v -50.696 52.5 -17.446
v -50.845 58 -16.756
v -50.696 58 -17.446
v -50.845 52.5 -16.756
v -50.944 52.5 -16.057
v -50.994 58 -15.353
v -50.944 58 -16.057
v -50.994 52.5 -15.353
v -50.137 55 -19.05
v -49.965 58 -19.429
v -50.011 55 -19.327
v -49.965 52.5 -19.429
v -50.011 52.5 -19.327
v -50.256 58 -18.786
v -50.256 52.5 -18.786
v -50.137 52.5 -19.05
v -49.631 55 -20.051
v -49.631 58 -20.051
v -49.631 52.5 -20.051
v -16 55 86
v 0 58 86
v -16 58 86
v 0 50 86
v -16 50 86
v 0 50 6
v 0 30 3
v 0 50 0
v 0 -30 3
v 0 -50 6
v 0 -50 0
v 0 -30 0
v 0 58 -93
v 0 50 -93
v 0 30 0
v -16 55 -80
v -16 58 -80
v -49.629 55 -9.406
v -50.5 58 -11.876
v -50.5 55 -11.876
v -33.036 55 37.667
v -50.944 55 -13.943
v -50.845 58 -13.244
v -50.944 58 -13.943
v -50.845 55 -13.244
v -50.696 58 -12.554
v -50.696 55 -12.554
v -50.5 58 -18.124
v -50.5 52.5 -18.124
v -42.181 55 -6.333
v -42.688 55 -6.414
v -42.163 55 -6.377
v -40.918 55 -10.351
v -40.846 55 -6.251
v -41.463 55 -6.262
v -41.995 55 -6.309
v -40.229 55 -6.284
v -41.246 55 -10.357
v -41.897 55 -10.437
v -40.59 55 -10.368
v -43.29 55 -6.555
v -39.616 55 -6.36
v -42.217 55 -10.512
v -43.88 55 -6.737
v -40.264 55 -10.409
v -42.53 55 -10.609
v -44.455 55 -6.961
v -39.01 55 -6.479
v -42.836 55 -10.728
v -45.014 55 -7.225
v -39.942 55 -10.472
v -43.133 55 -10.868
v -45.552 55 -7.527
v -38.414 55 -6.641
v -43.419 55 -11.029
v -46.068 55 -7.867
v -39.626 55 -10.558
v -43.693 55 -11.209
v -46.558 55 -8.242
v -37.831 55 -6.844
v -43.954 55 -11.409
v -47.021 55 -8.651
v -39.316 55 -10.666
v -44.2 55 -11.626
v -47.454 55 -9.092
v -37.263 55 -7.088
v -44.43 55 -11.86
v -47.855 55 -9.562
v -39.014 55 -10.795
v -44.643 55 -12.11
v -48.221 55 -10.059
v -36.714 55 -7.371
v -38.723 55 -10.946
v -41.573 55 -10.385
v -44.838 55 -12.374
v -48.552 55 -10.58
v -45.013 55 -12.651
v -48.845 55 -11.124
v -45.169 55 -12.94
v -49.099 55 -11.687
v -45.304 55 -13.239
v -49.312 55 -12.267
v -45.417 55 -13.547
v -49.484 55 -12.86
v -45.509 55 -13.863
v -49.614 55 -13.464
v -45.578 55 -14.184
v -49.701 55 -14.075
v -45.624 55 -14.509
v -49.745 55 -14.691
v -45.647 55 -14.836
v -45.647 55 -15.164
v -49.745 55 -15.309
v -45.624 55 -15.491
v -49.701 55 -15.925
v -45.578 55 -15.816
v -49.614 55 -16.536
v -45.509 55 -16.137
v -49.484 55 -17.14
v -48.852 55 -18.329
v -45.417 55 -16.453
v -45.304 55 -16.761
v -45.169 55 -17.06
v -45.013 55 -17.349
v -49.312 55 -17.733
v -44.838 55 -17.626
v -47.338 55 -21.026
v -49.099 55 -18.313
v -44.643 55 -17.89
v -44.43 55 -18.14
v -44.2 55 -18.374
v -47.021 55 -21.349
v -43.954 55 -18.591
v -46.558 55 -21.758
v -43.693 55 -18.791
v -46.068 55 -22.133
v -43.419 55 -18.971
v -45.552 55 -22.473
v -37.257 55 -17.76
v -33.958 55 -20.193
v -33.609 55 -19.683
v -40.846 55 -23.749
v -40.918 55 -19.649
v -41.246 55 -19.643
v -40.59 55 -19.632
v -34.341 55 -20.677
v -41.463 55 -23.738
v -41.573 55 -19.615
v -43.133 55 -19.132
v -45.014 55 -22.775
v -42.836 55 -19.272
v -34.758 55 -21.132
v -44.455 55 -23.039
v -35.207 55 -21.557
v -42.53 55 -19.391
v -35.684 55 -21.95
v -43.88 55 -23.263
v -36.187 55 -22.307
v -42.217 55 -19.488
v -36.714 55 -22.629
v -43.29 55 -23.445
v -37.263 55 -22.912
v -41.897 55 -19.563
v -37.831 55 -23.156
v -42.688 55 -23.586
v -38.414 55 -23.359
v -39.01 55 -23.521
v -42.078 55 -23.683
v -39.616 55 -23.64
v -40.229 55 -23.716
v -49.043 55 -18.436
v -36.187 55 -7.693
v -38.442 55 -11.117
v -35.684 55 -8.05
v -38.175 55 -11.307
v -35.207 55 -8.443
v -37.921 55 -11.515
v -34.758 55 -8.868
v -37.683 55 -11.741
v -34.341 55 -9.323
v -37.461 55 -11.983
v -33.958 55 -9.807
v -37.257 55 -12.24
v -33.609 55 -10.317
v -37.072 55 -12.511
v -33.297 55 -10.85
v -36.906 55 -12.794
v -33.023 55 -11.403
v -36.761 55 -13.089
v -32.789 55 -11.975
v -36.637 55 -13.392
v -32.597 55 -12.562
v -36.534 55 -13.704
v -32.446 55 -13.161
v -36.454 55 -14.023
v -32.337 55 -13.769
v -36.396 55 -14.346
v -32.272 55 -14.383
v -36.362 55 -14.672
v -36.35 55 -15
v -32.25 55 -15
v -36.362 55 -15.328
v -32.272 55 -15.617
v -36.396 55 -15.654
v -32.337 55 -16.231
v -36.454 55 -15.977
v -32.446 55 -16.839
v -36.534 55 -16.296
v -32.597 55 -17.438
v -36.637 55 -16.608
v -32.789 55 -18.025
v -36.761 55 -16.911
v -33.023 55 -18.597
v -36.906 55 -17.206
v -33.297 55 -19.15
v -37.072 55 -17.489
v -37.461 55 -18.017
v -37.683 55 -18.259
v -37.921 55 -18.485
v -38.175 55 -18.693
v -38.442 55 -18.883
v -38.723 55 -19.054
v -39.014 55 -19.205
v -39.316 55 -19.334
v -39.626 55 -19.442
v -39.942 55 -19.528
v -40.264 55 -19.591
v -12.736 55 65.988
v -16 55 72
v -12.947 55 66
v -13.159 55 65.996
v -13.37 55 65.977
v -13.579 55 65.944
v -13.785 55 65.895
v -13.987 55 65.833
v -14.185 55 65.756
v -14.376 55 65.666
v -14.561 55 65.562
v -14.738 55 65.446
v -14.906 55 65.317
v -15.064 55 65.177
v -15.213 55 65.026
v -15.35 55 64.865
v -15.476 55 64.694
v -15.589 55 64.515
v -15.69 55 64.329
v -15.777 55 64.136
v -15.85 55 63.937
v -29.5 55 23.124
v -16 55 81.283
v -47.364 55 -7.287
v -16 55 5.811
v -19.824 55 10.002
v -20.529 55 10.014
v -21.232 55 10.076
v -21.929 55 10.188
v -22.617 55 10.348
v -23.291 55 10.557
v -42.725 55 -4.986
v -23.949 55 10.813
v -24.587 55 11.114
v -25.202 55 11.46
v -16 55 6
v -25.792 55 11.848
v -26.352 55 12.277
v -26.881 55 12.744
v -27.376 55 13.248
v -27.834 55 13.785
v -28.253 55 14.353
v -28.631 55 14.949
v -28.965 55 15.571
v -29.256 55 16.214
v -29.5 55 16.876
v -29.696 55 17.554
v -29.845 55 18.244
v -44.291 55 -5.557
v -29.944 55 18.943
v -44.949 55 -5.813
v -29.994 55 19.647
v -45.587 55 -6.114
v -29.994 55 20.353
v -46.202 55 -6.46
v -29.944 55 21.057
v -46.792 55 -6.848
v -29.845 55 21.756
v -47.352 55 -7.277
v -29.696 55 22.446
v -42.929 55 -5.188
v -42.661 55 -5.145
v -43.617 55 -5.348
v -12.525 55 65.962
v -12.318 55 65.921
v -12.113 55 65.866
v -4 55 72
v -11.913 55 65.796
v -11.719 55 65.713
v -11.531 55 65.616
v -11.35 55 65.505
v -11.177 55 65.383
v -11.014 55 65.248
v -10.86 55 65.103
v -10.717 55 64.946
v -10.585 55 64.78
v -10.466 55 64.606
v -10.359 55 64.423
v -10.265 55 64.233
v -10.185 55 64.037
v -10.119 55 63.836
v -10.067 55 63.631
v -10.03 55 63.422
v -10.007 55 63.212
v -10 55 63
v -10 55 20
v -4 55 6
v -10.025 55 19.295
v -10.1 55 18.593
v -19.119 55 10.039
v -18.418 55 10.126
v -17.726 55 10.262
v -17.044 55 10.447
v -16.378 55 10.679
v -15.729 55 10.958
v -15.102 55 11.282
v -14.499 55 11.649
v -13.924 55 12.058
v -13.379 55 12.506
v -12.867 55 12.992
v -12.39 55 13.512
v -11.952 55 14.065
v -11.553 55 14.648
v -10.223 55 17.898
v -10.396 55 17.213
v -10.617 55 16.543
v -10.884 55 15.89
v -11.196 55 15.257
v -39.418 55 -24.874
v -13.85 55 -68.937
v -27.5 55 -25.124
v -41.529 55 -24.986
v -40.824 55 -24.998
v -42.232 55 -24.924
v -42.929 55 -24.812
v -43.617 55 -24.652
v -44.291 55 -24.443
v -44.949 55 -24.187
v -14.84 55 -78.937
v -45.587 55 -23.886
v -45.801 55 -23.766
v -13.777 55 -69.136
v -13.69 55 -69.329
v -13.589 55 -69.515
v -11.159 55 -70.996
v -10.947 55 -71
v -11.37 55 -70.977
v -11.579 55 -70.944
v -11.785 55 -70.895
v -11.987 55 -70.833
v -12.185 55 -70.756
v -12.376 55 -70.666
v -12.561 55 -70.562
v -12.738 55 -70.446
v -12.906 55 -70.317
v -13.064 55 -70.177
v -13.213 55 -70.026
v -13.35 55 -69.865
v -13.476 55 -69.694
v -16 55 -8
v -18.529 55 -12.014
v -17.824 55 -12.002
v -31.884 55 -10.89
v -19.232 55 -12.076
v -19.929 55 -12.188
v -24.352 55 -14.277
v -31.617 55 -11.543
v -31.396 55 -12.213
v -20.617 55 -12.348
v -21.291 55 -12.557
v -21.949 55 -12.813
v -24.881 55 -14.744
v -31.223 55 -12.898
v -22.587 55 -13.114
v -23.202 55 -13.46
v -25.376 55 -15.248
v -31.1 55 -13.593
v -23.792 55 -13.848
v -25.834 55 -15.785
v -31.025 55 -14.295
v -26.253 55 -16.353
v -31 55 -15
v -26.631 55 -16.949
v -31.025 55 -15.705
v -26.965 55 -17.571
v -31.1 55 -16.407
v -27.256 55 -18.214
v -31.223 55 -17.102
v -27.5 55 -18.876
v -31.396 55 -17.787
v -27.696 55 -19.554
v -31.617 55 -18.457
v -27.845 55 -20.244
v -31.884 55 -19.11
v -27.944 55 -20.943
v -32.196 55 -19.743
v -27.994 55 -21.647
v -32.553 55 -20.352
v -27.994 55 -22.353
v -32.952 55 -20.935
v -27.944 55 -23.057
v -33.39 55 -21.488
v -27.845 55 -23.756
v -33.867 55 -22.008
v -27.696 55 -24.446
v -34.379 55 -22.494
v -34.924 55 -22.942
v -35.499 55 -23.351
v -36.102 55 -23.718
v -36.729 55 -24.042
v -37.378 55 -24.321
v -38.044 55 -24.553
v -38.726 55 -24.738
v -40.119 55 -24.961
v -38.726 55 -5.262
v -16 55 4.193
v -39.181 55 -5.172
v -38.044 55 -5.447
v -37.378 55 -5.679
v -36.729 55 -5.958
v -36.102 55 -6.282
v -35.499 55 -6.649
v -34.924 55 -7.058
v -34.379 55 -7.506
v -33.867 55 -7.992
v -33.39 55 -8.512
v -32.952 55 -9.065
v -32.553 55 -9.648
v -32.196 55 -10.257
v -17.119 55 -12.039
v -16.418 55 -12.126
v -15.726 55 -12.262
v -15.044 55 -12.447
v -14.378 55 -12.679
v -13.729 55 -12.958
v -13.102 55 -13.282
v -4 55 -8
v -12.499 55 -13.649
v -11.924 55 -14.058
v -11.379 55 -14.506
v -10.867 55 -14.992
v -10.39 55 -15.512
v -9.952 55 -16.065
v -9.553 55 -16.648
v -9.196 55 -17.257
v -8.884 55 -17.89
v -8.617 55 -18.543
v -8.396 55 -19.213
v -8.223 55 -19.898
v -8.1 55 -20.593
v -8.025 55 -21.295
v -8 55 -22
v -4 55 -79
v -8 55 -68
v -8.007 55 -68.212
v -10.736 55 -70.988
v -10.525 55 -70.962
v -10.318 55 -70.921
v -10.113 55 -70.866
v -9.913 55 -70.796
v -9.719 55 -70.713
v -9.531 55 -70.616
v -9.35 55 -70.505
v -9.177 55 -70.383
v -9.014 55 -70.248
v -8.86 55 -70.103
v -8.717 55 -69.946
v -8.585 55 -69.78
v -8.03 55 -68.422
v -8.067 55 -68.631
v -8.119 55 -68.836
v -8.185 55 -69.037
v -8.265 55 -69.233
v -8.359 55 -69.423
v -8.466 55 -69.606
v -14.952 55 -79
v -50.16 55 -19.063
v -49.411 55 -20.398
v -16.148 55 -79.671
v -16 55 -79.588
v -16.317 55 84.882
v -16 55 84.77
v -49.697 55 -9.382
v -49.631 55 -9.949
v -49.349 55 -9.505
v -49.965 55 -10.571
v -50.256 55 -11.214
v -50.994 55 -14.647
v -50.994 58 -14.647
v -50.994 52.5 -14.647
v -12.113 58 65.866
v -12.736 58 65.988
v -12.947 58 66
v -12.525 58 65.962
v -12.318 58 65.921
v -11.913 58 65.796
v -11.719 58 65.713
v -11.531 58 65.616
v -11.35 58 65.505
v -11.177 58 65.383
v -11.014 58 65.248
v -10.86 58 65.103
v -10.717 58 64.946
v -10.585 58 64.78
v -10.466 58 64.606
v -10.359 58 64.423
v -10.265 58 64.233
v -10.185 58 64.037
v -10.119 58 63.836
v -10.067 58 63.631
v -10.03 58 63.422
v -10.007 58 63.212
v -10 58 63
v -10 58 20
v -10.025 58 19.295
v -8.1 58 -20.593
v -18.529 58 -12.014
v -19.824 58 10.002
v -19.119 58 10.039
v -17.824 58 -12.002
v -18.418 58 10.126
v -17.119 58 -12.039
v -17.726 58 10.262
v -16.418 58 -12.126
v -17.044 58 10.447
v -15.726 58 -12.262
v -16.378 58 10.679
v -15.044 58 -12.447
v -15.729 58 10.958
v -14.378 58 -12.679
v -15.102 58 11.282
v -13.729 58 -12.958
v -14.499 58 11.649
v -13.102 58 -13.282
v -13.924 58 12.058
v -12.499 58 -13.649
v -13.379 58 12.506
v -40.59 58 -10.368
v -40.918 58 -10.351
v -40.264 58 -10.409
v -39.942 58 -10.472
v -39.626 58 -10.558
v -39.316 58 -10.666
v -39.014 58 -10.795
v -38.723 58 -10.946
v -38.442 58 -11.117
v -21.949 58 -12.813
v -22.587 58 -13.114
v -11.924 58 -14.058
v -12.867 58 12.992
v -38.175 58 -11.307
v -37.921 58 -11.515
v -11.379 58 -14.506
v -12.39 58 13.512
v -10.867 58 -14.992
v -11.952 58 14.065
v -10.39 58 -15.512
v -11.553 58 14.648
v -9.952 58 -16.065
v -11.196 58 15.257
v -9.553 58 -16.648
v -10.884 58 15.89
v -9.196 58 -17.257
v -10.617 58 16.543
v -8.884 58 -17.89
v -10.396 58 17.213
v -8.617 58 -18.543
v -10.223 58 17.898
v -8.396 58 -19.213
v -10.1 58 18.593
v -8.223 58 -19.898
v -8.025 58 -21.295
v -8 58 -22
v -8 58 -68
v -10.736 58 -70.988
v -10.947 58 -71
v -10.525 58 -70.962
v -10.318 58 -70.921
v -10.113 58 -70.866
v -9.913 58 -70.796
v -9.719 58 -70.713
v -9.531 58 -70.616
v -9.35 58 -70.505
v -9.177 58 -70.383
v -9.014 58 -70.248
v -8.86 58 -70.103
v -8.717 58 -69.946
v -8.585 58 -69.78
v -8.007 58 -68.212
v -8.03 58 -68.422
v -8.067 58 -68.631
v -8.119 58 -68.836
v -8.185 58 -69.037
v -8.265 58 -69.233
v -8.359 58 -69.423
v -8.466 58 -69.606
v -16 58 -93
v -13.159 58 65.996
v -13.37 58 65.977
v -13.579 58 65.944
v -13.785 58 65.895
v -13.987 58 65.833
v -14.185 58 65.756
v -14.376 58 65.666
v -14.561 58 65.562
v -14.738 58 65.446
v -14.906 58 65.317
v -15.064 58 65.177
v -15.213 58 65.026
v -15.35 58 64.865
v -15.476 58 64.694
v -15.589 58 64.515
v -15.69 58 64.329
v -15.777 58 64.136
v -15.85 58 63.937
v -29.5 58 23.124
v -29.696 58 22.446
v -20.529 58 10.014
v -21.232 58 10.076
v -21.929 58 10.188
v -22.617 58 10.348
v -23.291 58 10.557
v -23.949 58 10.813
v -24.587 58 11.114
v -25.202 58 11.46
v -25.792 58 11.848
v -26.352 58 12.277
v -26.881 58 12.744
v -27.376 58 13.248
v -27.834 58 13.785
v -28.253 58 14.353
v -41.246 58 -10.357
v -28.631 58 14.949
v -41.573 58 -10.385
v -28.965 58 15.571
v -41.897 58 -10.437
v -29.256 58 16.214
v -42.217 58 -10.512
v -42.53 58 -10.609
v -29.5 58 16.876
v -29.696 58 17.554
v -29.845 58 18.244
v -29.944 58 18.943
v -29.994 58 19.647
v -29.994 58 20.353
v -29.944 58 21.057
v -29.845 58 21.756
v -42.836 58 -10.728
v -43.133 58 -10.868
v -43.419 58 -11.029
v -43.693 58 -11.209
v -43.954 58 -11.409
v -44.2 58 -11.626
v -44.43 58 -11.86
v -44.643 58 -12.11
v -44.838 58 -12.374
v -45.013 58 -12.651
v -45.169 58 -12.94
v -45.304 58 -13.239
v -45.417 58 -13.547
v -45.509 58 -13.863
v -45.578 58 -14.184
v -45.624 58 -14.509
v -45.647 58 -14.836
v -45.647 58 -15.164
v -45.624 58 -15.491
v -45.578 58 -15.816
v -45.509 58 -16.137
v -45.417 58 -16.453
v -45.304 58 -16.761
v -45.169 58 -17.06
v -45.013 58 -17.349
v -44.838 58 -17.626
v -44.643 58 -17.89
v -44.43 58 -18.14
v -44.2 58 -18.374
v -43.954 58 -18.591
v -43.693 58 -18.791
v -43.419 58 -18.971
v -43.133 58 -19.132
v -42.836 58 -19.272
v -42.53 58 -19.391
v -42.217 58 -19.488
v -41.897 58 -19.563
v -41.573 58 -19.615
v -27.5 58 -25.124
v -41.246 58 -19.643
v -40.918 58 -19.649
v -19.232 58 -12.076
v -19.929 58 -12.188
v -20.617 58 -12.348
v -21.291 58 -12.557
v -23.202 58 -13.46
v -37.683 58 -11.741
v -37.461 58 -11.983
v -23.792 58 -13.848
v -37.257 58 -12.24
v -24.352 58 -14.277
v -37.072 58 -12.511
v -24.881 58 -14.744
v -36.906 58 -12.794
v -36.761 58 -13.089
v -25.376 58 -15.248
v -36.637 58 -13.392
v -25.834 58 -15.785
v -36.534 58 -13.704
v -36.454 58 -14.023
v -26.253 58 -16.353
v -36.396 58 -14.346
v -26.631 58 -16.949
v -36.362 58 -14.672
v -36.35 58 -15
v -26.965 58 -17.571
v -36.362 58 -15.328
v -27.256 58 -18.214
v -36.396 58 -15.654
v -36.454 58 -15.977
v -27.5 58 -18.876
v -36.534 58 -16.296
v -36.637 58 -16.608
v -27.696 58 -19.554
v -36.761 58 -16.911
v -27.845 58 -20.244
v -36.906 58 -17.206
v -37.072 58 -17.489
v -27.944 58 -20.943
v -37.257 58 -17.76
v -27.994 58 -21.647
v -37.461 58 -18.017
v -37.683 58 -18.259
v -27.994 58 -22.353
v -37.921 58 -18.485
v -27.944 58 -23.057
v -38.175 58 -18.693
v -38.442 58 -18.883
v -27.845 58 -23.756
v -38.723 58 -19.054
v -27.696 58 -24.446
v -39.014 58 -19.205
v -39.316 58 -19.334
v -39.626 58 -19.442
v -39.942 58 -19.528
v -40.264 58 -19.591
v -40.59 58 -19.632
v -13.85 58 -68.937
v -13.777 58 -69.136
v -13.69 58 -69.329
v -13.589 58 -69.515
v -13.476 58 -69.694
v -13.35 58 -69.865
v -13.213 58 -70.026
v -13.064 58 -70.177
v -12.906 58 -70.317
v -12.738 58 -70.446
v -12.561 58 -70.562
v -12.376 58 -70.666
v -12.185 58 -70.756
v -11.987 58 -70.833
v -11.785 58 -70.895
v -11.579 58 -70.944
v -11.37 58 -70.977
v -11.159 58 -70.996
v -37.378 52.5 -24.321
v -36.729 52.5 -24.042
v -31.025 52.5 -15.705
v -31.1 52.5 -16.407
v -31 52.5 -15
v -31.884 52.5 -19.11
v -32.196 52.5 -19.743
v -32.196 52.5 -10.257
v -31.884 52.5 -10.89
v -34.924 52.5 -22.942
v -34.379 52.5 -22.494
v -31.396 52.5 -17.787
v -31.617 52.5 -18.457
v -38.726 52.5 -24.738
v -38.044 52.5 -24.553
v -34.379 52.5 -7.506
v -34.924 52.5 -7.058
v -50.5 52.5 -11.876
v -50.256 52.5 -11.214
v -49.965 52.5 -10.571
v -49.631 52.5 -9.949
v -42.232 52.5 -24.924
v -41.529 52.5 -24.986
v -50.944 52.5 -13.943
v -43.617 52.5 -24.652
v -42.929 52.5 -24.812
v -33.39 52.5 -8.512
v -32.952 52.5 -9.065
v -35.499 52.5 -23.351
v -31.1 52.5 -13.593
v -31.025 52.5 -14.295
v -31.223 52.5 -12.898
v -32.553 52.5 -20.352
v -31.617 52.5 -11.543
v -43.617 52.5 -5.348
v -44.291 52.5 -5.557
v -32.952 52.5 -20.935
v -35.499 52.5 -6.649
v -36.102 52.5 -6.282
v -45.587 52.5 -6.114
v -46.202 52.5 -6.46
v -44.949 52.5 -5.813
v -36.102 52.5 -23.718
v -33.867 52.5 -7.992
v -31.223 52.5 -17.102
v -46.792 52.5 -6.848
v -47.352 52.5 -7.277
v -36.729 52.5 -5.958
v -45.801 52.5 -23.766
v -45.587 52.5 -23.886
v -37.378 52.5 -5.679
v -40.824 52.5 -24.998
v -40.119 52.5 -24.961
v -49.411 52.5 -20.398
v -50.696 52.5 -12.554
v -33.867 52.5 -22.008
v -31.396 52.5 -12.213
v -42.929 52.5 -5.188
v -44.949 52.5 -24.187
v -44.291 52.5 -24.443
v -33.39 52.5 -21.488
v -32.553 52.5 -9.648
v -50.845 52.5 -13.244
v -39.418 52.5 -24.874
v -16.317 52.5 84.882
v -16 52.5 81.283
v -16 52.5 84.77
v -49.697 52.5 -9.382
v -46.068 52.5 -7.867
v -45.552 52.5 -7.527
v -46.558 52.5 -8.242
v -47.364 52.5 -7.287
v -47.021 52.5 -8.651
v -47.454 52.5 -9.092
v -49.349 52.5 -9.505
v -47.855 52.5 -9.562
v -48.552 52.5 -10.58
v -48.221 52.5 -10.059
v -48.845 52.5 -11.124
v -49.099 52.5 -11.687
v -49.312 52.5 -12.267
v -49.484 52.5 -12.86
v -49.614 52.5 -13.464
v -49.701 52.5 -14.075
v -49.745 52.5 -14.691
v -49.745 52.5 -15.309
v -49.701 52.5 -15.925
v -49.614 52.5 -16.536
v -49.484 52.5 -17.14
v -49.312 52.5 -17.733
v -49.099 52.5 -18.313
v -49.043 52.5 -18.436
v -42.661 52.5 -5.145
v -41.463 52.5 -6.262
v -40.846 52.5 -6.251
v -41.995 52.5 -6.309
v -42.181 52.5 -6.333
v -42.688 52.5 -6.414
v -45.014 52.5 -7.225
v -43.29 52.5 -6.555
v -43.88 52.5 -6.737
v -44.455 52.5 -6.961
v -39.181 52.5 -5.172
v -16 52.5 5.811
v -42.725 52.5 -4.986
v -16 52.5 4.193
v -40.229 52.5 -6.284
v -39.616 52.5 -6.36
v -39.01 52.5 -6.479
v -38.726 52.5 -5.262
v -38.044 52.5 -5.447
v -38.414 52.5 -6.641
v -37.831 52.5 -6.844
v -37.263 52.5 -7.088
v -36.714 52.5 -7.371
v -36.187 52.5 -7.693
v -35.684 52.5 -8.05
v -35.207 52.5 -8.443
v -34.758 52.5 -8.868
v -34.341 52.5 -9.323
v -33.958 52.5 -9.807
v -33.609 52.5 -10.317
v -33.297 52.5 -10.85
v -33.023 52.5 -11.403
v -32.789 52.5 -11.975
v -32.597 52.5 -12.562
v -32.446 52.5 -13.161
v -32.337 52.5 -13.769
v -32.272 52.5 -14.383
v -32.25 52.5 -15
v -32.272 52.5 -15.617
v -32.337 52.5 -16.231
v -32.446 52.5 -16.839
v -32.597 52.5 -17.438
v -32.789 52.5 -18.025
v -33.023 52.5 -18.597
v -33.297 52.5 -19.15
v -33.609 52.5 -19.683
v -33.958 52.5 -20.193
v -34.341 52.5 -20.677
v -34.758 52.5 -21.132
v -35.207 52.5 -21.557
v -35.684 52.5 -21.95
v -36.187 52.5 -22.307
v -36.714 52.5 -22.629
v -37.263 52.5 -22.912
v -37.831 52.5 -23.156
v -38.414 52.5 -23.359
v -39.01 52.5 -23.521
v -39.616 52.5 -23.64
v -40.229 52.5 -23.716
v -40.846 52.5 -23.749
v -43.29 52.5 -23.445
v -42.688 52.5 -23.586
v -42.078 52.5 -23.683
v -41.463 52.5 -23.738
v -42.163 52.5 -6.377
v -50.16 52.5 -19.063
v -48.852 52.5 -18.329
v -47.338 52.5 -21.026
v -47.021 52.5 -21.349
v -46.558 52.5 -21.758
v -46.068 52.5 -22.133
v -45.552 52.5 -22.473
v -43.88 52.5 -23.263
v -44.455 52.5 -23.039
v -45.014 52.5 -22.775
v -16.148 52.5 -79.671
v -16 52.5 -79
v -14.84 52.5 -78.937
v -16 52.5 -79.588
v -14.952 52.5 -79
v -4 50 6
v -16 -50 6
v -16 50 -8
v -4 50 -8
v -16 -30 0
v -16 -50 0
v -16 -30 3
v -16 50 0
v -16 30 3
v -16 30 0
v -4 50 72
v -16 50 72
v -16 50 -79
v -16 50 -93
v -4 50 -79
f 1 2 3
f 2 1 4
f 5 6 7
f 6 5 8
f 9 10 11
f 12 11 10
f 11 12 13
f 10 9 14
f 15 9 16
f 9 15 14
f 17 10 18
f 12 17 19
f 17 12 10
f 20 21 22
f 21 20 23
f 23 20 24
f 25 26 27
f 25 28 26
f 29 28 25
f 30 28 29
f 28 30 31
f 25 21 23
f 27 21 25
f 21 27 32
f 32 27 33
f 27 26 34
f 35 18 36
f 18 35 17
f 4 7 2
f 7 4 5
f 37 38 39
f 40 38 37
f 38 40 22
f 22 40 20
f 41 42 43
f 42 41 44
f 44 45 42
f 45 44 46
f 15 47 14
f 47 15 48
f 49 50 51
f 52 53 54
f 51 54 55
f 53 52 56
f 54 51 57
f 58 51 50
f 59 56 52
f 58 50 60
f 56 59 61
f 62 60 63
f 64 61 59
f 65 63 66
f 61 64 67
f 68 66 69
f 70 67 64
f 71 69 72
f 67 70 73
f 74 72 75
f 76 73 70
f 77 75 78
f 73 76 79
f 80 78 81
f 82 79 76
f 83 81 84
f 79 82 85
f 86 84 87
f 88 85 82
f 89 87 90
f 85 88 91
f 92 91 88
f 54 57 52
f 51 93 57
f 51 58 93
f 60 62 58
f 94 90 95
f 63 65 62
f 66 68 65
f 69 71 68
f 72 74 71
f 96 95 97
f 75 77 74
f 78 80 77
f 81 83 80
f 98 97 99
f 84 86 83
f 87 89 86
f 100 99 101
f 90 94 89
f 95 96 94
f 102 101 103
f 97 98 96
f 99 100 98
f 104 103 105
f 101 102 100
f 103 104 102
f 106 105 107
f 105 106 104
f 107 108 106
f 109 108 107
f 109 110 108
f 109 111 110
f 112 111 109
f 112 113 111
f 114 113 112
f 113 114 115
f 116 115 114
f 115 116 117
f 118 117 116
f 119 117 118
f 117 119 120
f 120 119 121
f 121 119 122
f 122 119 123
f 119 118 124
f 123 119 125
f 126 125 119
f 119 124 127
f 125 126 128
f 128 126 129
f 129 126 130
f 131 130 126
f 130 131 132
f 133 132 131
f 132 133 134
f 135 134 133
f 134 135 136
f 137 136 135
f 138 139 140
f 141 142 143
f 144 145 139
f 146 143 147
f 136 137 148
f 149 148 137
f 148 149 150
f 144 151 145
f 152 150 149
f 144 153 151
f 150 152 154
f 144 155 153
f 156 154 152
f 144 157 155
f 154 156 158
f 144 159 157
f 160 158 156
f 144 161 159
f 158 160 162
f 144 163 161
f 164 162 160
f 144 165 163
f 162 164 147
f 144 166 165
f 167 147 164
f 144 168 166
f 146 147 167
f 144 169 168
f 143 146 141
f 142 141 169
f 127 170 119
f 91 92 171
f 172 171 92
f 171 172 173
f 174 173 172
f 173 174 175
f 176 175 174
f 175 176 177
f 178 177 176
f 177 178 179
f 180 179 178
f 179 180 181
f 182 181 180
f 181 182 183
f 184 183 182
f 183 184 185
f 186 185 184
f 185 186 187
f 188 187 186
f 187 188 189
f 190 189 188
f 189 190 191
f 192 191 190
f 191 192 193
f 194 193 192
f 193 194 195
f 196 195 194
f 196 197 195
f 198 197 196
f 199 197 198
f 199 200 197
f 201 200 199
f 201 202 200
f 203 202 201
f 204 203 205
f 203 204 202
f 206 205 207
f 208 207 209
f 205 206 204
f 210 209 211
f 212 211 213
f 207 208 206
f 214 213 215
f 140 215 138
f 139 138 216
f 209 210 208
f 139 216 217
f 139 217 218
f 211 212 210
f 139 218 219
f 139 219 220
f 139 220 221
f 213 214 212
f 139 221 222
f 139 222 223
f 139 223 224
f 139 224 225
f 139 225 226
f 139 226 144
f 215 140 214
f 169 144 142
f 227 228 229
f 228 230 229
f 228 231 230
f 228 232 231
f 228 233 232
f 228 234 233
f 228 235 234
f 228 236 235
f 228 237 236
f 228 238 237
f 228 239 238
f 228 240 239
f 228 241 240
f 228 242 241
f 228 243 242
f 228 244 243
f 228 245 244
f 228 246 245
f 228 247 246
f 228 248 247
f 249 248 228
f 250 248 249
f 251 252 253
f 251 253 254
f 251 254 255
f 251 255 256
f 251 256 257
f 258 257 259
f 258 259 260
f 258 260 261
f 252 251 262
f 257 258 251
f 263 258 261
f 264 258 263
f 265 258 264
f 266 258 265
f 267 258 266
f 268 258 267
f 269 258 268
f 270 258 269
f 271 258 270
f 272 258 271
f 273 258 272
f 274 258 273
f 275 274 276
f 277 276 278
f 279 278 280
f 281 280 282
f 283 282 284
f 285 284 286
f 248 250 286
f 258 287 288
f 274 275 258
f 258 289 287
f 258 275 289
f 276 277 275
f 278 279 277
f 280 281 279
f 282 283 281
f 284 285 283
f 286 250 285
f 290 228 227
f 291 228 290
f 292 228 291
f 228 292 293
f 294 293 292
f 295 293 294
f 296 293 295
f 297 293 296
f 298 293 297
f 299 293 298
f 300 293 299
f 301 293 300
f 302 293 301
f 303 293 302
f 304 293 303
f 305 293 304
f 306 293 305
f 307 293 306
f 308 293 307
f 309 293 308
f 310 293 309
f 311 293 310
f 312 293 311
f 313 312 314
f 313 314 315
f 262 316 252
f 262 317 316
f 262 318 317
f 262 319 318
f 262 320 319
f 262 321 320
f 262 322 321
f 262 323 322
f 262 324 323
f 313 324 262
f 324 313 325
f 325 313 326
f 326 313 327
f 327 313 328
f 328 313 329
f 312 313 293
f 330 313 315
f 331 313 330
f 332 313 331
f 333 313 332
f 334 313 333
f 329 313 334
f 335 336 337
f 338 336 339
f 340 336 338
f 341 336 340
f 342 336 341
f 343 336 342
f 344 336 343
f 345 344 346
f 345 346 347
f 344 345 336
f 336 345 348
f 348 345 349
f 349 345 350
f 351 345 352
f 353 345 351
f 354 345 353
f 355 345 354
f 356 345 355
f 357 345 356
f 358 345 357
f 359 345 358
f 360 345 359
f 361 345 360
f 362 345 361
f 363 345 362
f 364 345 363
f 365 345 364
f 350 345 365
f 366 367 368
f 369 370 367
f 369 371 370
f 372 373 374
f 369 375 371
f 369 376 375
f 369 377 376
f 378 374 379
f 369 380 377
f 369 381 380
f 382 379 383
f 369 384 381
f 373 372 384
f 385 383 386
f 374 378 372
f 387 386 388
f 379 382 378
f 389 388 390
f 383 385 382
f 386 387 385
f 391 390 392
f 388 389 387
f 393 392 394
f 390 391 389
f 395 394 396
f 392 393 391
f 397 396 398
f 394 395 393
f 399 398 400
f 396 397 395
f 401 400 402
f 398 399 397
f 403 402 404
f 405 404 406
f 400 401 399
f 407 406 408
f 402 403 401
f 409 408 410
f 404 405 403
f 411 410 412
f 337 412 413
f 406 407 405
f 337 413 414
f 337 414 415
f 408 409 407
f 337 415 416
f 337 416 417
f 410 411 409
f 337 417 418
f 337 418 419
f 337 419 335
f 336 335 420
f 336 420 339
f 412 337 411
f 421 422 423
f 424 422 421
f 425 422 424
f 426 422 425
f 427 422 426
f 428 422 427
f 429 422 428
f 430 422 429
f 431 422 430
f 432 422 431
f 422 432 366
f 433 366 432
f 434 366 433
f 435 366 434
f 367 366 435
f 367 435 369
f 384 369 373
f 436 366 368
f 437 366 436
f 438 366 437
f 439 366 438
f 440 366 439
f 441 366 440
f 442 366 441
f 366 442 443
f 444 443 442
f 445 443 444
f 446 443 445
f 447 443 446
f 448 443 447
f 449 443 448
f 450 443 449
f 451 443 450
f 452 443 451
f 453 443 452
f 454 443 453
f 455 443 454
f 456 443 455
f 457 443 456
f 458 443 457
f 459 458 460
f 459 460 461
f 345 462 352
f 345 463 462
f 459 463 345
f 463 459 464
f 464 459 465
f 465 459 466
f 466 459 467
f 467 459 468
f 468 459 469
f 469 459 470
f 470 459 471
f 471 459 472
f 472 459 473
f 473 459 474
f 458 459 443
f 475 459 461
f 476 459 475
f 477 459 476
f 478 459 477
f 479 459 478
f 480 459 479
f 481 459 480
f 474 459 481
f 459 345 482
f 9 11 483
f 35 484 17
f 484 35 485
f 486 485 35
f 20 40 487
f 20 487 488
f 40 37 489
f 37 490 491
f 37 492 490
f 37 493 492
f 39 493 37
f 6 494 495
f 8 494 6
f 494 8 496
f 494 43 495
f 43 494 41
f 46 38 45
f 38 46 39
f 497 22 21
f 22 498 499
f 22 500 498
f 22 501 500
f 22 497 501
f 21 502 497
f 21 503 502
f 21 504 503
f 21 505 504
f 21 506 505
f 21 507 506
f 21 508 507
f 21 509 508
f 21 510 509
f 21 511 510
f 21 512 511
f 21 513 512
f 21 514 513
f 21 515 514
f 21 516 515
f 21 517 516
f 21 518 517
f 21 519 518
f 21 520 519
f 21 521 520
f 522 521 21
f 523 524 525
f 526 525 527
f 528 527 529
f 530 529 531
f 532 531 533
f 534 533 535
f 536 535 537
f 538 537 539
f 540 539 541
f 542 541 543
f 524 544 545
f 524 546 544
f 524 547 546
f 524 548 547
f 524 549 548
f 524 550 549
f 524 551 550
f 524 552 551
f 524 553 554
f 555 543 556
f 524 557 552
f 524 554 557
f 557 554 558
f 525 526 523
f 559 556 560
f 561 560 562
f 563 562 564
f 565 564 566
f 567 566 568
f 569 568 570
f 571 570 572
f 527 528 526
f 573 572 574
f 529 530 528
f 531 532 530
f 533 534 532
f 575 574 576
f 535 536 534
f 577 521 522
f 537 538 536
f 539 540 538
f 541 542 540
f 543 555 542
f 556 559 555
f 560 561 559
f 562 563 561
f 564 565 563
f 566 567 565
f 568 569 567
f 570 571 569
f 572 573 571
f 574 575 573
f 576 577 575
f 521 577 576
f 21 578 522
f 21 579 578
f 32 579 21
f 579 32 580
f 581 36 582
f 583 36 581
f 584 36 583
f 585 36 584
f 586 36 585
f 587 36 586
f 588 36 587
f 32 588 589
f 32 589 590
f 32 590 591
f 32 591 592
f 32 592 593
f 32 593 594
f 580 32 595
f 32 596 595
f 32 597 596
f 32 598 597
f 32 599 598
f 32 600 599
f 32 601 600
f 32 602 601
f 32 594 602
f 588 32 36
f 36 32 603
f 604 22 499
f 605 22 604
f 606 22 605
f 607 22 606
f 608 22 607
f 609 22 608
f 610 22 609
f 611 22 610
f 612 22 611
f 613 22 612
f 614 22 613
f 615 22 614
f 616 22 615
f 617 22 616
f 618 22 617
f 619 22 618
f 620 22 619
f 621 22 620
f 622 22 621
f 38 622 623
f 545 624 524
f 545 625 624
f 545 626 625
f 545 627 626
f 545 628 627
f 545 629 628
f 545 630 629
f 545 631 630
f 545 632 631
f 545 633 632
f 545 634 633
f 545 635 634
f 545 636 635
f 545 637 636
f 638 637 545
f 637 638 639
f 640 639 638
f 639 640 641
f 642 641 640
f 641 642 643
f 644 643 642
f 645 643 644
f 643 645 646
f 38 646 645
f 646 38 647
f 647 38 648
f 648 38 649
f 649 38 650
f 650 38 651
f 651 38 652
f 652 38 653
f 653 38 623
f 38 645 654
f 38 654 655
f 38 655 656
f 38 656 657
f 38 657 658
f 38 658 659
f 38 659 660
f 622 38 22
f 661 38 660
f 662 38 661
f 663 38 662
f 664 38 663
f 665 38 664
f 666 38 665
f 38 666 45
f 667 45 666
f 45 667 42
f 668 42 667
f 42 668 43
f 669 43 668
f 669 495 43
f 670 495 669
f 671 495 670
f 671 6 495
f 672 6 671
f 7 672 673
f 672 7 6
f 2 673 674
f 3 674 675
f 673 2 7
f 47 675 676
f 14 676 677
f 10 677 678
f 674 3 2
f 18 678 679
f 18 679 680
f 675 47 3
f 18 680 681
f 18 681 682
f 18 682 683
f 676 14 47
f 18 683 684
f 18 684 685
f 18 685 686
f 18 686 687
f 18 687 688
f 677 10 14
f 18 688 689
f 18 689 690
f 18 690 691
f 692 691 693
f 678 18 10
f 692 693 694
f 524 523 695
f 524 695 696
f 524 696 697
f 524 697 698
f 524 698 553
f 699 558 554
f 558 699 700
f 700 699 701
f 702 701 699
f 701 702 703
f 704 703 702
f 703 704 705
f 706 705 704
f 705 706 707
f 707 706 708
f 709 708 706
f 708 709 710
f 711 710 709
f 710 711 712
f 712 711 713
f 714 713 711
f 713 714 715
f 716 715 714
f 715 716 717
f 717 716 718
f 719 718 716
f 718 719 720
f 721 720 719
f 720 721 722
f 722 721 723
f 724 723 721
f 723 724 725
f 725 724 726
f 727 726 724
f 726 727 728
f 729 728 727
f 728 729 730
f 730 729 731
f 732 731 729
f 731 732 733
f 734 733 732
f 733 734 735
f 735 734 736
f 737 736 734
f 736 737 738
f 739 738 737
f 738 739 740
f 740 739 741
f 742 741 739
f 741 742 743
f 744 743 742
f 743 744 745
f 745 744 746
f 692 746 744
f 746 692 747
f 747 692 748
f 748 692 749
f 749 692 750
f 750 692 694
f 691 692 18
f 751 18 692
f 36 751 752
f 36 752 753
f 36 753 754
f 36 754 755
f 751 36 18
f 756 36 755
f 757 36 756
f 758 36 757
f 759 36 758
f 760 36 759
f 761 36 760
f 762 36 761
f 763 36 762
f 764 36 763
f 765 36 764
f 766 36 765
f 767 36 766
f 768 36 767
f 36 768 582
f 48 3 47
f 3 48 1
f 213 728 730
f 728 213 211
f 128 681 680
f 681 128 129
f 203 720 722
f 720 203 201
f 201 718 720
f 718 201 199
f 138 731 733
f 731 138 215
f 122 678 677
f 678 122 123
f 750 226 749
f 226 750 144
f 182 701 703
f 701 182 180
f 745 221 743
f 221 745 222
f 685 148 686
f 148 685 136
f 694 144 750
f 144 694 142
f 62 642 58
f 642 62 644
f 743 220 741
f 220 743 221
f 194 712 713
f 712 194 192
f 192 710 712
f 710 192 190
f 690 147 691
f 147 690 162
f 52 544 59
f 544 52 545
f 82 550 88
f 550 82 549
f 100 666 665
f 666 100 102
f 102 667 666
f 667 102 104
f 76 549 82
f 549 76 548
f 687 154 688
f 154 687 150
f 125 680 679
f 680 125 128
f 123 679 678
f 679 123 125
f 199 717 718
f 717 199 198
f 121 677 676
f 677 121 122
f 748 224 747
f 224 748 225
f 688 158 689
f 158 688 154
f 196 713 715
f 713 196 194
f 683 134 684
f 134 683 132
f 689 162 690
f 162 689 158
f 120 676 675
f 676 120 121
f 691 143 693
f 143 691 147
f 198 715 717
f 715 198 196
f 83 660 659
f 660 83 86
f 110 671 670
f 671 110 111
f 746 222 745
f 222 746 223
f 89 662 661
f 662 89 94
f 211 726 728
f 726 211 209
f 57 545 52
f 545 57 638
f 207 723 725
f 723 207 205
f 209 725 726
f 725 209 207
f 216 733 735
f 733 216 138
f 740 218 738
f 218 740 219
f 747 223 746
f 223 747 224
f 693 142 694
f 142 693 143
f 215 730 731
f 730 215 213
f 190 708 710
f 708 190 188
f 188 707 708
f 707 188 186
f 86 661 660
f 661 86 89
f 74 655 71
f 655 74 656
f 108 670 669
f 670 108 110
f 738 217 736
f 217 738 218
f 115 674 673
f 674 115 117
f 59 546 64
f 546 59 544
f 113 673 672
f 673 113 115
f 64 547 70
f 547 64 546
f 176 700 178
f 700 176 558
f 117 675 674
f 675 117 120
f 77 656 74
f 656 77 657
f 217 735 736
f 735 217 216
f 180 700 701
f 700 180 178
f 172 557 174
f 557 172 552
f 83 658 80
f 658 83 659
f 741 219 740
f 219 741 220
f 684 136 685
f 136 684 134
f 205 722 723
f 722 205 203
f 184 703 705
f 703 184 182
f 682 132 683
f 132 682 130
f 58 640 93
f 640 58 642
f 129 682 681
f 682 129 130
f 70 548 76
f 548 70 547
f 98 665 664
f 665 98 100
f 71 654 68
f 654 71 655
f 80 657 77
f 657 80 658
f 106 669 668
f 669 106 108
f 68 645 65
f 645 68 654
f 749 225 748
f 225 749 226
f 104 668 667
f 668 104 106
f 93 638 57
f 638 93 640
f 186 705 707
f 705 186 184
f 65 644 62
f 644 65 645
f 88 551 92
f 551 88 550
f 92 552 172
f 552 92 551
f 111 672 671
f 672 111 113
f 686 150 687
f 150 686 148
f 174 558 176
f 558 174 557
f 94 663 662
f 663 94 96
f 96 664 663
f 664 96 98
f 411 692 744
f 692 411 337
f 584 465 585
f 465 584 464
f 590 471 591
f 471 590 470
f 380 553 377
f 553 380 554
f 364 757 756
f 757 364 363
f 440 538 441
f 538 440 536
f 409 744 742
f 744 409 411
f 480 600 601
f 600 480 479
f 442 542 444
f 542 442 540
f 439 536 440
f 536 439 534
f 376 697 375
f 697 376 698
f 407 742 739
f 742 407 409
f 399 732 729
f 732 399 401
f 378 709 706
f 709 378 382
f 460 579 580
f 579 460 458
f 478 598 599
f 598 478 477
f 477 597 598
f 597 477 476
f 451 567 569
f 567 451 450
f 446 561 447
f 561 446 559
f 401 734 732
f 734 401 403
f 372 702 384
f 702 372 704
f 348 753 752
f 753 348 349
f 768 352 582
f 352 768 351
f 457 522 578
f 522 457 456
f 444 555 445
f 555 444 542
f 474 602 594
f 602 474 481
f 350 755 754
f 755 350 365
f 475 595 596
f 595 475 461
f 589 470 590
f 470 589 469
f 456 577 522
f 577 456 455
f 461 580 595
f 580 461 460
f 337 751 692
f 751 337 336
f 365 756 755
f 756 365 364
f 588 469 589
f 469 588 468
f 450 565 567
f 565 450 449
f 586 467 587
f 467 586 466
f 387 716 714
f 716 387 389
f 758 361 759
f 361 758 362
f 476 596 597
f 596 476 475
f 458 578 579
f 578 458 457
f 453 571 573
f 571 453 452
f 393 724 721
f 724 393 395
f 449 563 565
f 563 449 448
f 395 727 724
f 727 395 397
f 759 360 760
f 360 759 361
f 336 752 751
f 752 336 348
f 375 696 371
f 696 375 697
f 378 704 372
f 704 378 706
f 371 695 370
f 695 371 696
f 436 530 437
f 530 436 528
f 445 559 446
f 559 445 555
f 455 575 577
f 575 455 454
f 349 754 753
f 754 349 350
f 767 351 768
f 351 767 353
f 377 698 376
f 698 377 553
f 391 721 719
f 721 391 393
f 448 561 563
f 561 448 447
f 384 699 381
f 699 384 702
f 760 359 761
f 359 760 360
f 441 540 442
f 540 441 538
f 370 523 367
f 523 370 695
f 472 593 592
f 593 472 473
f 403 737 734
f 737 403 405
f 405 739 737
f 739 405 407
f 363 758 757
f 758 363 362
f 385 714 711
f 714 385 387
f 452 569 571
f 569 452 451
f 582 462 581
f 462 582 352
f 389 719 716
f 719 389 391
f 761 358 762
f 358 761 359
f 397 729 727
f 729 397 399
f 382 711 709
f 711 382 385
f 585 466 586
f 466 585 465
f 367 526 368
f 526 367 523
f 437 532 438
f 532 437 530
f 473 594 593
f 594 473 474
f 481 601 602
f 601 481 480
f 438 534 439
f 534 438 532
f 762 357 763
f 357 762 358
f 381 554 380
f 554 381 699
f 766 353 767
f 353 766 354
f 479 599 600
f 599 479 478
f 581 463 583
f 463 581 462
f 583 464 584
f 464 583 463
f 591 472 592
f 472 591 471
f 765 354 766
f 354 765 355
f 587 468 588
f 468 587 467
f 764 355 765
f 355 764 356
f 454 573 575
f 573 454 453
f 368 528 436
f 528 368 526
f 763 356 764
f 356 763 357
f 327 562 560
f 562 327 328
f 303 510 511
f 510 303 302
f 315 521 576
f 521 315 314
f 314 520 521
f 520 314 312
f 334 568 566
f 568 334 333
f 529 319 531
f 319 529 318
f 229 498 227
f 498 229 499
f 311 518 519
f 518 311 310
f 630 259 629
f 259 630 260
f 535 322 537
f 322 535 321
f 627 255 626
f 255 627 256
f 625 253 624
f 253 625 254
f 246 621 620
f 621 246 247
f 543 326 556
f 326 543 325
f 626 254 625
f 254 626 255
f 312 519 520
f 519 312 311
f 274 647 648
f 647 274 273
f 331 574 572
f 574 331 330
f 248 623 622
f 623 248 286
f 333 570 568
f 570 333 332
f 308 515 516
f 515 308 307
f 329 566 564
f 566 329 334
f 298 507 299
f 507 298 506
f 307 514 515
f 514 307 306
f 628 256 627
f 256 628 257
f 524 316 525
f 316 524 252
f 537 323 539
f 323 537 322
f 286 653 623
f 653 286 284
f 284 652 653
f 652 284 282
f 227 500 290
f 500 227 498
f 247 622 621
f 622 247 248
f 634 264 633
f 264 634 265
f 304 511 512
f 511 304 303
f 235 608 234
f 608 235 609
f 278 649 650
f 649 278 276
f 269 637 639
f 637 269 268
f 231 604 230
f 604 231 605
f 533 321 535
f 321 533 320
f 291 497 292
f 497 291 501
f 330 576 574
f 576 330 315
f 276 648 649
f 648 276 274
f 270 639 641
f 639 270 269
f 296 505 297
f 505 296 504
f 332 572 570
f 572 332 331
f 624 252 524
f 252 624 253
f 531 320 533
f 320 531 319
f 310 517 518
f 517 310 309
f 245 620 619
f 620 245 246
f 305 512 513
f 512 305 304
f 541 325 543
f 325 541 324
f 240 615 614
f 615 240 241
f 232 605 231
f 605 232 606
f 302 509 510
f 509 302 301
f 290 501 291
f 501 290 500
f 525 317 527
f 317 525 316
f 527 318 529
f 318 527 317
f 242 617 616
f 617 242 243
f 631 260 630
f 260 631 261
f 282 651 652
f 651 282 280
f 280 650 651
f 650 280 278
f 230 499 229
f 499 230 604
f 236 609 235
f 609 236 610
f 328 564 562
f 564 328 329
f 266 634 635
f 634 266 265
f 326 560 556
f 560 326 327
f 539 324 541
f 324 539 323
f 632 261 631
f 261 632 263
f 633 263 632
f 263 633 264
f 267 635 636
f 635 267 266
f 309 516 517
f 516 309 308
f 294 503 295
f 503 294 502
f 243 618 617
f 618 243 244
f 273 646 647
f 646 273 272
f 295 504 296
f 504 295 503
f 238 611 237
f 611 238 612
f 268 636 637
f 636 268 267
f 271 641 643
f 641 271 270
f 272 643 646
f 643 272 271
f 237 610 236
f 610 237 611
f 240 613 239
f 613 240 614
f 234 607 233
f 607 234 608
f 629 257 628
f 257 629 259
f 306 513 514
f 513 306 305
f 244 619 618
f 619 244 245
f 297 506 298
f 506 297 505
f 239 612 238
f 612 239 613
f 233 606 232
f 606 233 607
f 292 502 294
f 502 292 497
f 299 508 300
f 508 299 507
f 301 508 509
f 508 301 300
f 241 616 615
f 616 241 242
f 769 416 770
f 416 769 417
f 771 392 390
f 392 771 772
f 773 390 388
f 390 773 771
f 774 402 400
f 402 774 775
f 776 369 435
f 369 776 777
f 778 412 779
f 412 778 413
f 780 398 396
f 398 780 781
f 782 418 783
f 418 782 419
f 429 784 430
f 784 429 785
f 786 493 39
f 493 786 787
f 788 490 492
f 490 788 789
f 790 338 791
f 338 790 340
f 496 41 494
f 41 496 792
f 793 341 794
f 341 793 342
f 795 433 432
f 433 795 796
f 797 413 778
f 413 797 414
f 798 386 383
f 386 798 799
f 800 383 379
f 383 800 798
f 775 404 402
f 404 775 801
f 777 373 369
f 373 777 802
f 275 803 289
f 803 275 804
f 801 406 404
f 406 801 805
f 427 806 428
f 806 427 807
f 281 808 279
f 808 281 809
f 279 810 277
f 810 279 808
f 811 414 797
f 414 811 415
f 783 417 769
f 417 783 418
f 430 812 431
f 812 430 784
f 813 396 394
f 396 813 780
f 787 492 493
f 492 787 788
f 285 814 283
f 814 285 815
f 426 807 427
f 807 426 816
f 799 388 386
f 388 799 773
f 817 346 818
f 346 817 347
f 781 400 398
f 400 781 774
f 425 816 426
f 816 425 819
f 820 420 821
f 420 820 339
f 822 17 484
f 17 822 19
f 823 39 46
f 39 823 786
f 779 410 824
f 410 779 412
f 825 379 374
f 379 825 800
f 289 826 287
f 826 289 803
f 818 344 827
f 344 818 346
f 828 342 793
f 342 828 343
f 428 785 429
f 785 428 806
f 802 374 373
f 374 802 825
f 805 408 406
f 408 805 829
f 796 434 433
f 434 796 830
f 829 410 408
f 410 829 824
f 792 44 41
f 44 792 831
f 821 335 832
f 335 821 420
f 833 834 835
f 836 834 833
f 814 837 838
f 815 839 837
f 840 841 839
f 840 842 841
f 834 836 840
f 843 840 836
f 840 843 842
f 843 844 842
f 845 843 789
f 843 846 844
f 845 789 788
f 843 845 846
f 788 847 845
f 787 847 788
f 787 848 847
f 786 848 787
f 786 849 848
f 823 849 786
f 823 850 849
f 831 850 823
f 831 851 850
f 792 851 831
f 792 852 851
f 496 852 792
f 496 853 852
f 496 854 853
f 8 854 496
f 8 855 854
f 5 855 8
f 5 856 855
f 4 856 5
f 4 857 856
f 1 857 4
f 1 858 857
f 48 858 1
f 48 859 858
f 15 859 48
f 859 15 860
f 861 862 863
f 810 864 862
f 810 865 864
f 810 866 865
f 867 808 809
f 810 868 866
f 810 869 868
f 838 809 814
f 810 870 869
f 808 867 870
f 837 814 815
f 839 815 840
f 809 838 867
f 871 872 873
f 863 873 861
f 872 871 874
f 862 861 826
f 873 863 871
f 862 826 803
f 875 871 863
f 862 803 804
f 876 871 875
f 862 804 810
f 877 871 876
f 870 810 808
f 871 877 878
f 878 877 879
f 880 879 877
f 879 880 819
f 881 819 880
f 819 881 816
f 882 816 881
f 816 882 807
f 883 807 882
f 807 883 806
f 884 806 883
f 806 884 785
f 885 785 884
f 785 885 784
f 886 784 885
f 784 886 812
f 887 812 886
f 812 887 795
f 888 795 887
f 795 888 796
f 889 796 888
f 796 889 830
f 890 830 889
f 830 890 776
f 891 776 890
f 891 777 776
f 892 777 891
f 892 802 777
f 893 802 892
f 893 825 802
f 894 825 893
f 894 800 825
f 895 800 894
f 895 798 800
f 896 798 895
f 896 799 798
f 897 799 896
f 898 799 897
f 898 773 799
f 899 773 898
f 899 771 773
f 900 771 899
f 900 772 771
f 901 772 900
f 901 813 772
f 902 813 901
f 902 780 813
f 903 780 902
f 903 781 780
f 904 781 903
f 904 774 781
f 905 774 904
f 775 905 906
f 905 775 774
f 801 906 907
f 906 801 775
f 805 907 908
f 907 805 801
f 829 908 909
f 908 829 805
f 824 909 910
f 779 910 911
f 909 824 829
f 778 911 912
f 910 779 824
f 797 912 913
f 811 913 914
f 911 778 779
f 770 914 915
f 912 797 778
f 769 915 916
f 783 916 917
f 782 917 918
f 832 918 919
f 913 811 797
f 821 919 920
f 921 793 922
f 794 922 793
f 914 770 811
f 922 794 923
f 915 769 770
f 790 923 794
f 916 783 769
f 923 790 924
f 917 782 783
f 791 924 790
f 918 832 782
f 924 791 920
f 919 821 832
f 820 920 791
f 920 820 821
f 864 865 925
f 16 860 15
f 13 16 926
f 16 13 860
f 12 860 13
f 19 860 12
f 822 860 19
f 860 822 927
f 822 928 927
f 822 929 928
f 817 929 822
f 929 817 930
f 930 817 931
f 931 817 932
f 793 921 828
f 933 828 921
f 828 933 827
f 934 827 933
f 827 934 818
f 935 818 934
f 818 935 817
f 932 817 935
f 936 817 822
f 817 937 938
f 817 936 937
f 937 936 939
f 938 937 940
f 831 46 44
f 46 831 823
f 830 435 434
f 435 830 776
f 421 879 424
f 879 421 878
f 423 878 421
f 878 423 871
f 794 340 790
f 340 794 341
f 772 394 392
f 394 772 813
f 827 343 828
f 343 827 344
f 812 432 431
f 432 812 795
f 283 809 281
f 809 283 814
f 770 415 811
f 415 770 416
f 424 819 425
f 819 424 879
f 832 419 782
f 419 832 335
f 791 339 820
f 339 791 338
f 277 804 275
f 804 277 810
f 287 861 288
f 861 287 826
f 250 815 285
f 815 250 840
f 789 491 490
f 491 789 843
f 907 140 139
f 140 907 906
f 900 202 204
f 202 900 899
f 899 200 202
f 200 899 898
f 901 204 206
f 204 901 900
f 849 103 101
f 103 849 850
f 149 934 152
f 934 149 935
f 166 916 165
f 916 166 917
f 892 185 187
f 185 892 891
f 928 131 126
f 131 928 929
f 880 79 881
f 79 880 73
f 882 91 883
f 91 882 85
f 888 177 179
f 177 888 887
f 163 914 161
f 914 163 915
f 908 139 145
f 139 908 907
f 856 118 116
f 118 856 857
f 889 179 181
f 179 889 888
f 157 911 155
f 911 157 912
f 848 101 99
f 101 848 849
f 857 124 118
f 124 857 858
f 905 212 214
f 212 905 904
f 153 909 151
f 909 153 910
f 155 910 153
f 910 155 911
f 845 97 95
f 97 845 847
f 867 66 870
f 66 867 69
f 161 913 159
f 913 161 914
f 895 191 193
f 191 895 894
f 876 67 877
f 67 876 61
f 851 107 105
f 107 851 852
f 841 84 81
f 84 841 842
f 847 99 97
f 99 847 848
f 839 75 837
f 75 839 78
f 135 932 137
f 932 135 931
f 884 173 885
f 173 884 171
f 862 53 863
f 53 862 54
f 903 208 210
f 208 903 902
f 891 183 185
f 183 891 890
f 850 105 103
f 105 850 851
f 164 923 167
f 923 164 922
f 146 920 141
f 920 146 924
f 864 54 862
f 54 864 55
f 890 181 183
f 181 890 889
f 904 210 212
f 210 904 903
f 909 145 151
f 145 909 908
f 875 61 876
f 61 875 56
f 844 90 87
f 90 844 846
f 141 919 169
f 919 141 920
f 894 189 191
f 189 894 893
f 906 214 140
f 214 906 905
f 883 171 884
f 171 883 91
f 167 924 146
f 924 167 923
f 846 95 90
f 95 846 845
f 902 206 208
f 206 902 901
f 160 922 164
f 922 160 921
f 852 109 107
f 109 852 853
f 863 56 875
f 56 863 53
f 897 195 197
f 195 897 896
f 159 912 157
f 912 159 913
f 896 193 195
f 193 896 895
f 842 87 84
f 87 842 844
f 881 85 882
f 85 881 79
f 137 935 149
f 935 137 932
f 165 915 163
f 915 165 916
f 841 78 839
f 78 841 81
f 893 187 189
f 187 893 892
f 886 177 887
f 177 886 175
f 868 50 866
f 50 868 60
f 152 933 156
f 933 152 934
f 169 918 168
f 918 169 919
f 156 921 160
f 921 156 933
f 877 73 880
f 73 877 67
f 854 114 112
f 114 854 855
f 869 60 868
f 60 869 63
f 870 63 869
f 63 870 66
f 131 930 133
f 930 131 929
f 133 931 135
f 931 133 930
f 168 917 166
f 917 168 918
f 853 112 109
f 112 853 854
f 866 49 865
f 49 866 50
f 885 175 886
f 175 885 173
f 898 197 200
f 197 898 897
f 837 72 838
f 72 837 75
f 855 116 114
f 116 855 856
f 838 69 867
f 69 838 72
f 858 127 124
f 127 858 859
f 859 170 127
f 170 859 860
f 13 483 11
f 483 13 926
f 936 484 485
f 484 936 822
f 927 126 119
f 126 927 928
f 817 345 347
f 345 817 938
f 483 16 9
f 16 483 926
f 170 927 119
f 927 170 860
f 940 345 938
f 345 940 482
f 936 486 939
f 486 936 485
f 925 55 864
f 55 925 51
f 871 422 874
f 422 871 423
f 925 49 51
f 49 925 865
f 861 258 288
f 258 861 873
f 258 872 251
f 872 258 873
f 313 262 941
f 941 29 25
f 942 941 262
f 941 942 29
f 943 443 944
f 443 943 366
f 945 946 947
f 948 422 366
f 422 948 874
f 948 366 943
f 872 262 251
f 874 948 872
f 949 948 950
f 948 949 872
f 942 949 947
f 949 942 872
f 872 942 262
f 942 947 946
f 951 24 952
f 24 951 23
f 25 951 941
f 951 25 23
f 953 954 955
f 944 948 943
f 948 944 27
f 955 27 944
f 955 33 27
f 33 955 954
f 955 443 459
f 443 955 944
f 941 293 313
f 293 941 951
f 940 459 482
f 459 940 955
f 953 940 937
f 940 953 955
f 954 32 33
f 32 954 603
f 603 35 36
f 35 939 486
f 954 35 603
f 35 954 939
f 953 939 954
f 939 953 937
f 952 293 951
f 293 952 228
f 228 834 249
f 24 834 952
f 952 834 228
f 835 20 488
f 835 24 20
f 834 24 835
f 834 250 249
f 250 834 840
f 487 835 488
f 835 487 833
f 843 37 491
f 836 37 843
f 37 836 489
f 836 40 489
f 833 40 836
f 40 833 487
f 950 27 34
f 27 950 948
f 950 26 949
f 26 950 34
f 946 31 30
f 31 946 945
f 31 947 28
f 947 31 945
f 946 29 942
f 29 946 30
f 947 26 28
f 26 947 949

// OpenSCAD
// file: ../Parts/rounder.scad
// rounder.scad
// cutting tool for rounding off corners with a cylinder

//---------------------
module rounder(
r=10,   // radius
h=10,   // height
f=22,    // $fn
extra=0.01  // extra size for the cube
){

difference(){
  translate([-extra,-extra,-extra])
  cube([r+extra,r+extra,h+2*extra]);
  translate([r,r,-1])
  cylinder(r=r,h=h+2,$fn=f);
}

}

//========================

rounder();

//========================
// main file
//=================================================================================
// tele.scad
//
// TelePrompter parts for the fluid head on tripod
//
// Dr Tom Flint, 25 May 2021
//=================================================================================

use <../Parts/rounder.scad>

//--------------------------------------------------------------------------------

topThick=3;
bridgeThick=3;
sideThick=3;
frontThick=3;
x1=2;   // offset for M3 attach points

$fn=89;

module bracket(){
  
  // top pads
  difference(){
    translate([-25.5,44,topThick])
    cube([51,28,topThick*2],center=true);
  
    translate([-50.5,30,0])
    scale([1.5,1,1])
    cylinder(r=23,h=30,center=true,$fn=222);
  }
  difference(){
    translate([-25.5,-44,topThick])
    cube([51,28,topThick*2],center=true);
  
    translate([-50.5,-30,0])
    scale([1.5,1,1])
    cylinder(r=23,h=30,center=true,$fn=222);
  }
  
  // top bridge
  translate([-8,0,bridgeThick/2+topThick])
  cube([16,100,bridgeThick],center=true);
  
  // sides
  difference(){
  color("orange")
    union(){
      translate([-41,55,-15])
      rotate([-90,0,0])
      cylinder(r=10,h=sideThick);

      translate([-25.5,55+sideThick/2,-8+bridgeThick/2+topThick/2])
      cube([51,sideThick,16+topThick+bridgeThick],center=true);

      translate([-4,50+sideThick,-8+bridgeThick/2+topThick/2])
      cube([8,sideThick*2,16+topThick+bridgeThick],center=true);
    }
    
    translate([-41,55,-15])
    rotate([-90,0,0])
    cylinder(r=9.3/2,h=sideThick*3,center=true);
  }  

  
  mirror([0,1,0])
  difference(){
  color("orange")
    union(){
      translate([-41,55,-15])
      rotate([-90,0,0])
      cylinder(r=10,h=sideThick);

      translate([-25.5,55+sideThick/2,-8+bridgeThick/2+topThick/2])
      cube([51,sideThick,16+topThick+bridgeThick],center=true);

      translate([-4,50+sideThick,-8+bridgeThick/2+topThick/2])
      cube([8,sideThick*2,16+topThick+bridgeThick],center=true);
    }
    
    translate([-41,55,-15])
    rotate([-90,0,0])
    cylinder(r=9.3/2,h=sideThick*3,center=true);
  }  
  
  // front plate
  color("green")
  difference(){
    union(){
      translate([frontThick/2,0,-0.5*(16+topThick+bridgeThick)+topThick+bridgeThick])
      cube([frontThick,110+2*sideThick,16+topThick+bridgeThick],center=true);
      
      translate([x1+frontThick/2, 55, -0.5*(16+topThick+bridgeThick)+topThick+bridgeThick])
      cylinder(r=frontThick,h=(16+topThick+bridgeThick),center=true);

      translate([x1+frontThick/2, -55, -0.5*(16+topThick+bridgeThick)+topThick+bridgeThick])
      cylinder(r=frontThick,h=(16+topThick+bridgeThick),center=true);
    }
    
    // holes for M3x30
    translate([x1+frontThick/2, 55, -0.5*(30+topThick+bridgeThick)+topThick+bridgeThick])
    cylinder(r=1.8,h=(40+topThick+bridgeThick),center=true);

    translate([x1+frontThick/2, -55, -0.5*(30+topThick+bridgeThick)+topThick+bridgeThick])
    cylinder(r=1.8,h=(40+topThick+bridgeThick),center=true);

/*
    translate([frontThick, -54, -22])
    rotate([0,0,90])
    rounder(r=3,h=30,f=89);

    translate([frontThick, 54, -22])
    rotate([0,0,180])
    rounder(r=3,h=30,f=89);
    */
    
    // arch cut
    translate([0, 0, -30])
    rotate([0,90,0])
    scale([1,1.8,1])
    cylinder(r=31,h=40,center=true,$fn=222);
  }
}



//-----------------------------------------------------------------------
module bridge2(){
  
  // top pads
  translate([-8,40,topThick])
  cube([16,20,topThick*2],center=true);

  translate([-8,-40,topThick])
  cube([16,20,topThick*2],center=true);
  
  // top bridge
  translate([-8,0,bridgeThick/2+topThick])
  cube([16,100-16,bridgeThick],center=true);
}
  

//-----------------------------------------------------------------------
module bracket2(){
  
  // sides
  color("orange")
  difference(){
    hull(){
      // around the screw
      translate([-41,55,-15])
      rotate([-90,0,0])
      cylinder(r=10,h=sideThick);

      // vertical side plate
      translate([-8,55+sideThick/2,bridgeThick/2+topThick/2])
      cube([16,sideThick,160+topThick+bridgeThick],center=true);

    }
    
    // mount hole for the 3/8 screw to fluid head
    translate([-41,55,-15])
    rotate([-90,0,0])
    cylinder(r=9.3/2,h=sideThick*4,center=true);
    
    // material reduce
    hull(){
      translate([-18,55,-22])
      rotate([-90,0,0])
      cylinder(r=10,h=sideThick*3,center=true);
      
      translate([-11,55,-68])
      rotate([-90,0,0])
      cylinder(r=3,h=sideThick*3,center=true);
    }

    hull(){
      translate([-20,55,20])
      rotate([-90,0,0])
      cylinder(r=10,h=sideThick*3,center=true);
      
      translate([-13,55,63])
      rotate([-90,0,0])
      cylinder(r=3,h=sideThick*3,center=true);
    }

  }  

  color("cyan")
  translate([-41,55-2.5,-15])
  rotate([-90,0,0])
  difference(){
    cylinder(r=10,h=sideThick+2.5);
    cylinder(r=17.5/2,h=sideThick+10,center=true);
  }

  color("pink")
  translate([-32.5,53.75,-52+bridgeThick/2+topThick/2])
  rotate([0,-29.3,0])
  cube([1.5,2.5,63.5+topThick+bridgeThick],center=true);

  color("blue")
  translate([-29,53.75,-0.25])
  rotate([0,68,0])
  cube([1.5,2.5,29],center=true);

  color("red")
  translate([-8,50+sideThick,-4+bridgeThick/2+topThick/2])
  cube([16,sideThick*2,8+topThick+bridgeThick],center=true);
 
  color("green")
  translate([-2,50+sideThick,bridgeThick/2+topThick/2])
  cube([4,sideThick*2,160+topThick+bridgeThick],center=true);

  color("blue")
  translate([-8,50+sideThick+1,-86])
  cube([16,sideThick*2+2,8+topThick+bridgeThick],center=true);

  color("cyan")
  translate([-8,50+sideThick+1,79])
  cube([16,sideThick*2+2,8+topThick+bridgeThick],center=true);

  color("pink")
  translate([-32.3,53.75,37.5])
  rotate([0,19.5,0])
  cube([1.5,2.5,100],center=true);


  
}
//------------------------------------------------------------------------------
module L1(){

  // post
  difference(){
    translate([3.5+frontThick/2, 56, -45+topThick+bridgeThick+4])
    cube([13,14,90],center=true);

    translate([0.5+frontThick/2, 56-3, -45+topThick+bridgeThick-29])
    cube([12,14,70],center=true);

    // M3 attach point
    translate([x1+frontThick/2, 55, -0.5*(40+topThick+bridgeThick)+topThick+bridgeThick+4])
    cylinder(r=1.8,h=(40+topThick+bridgeThick),center=true);
    
    // front plate
    union(){
      translate([frontThick/2+0.1-2,0,-0.5*(16.2+topThick+bridgeThick)+topThick+bridgeThick])
      cube([frontThick+0.2+4,110.2+2*sideThick,16.2+topThick+bridgeThick],center=true);
      
      translate([x1+frontThick/2+0.1, 55, -0.5*(16+topThick+bridgeThick)+topThick+bridgeThick])
      cylinder(r=frontThick+0.2,h=(16.2+topThick+bridgeThick),center=true);

      translate([x1+frontThick/2+0.1, -55, -0.5*(16+topThick+bridgeThick)+topThick+bridgeThick])
      cylinder(r=frontThick+0.2,h=(16.2+topThick+bridgeThick),center=true);
    }  
  }
  
  // foot
  difference(){
    union(){
      color("red")
      translate([62.5,61.5,-85])
      cube([120+8,3,10],center=true);
      
      color("green")
      translate([62.5,56,-81.5])
      cube([120+8,14,3],center=true);
      
      color("pink")
      translate([-1.5,60,-81.5-1.5])
      rotate([0,90,0])
      rotate([0,0,-90])
      rounder(h=120+8,r=6,f=89);
    }
    translate([40,54,-90])
    cylinder(r=1.8,h=30,center=true);
    translate([80,54,-90])
    cylinder(r=1.8,h=30,center=true);
    translate([120,54,-90])
    cylinder(r=1.8,h=30,center=true);
  }
  
  color("blue")
  translate([11.5, 63, -80])
  rotate([90,0,0])
  rotate([0,0,0])
  rounder(h=14,r=10,f=89);

  color("cyan")
  translate([8, 63-14, -80])
  rotate([0,0,180])
  rotate([90,0,0])
  rounder(h=14,r=10,f=89);

}
//=================================================================================


bracket2();

color("gray")
bridge2();


//color("gray")
//mirror([0,1,0])
//bracket2();

//=================================================================================
  
